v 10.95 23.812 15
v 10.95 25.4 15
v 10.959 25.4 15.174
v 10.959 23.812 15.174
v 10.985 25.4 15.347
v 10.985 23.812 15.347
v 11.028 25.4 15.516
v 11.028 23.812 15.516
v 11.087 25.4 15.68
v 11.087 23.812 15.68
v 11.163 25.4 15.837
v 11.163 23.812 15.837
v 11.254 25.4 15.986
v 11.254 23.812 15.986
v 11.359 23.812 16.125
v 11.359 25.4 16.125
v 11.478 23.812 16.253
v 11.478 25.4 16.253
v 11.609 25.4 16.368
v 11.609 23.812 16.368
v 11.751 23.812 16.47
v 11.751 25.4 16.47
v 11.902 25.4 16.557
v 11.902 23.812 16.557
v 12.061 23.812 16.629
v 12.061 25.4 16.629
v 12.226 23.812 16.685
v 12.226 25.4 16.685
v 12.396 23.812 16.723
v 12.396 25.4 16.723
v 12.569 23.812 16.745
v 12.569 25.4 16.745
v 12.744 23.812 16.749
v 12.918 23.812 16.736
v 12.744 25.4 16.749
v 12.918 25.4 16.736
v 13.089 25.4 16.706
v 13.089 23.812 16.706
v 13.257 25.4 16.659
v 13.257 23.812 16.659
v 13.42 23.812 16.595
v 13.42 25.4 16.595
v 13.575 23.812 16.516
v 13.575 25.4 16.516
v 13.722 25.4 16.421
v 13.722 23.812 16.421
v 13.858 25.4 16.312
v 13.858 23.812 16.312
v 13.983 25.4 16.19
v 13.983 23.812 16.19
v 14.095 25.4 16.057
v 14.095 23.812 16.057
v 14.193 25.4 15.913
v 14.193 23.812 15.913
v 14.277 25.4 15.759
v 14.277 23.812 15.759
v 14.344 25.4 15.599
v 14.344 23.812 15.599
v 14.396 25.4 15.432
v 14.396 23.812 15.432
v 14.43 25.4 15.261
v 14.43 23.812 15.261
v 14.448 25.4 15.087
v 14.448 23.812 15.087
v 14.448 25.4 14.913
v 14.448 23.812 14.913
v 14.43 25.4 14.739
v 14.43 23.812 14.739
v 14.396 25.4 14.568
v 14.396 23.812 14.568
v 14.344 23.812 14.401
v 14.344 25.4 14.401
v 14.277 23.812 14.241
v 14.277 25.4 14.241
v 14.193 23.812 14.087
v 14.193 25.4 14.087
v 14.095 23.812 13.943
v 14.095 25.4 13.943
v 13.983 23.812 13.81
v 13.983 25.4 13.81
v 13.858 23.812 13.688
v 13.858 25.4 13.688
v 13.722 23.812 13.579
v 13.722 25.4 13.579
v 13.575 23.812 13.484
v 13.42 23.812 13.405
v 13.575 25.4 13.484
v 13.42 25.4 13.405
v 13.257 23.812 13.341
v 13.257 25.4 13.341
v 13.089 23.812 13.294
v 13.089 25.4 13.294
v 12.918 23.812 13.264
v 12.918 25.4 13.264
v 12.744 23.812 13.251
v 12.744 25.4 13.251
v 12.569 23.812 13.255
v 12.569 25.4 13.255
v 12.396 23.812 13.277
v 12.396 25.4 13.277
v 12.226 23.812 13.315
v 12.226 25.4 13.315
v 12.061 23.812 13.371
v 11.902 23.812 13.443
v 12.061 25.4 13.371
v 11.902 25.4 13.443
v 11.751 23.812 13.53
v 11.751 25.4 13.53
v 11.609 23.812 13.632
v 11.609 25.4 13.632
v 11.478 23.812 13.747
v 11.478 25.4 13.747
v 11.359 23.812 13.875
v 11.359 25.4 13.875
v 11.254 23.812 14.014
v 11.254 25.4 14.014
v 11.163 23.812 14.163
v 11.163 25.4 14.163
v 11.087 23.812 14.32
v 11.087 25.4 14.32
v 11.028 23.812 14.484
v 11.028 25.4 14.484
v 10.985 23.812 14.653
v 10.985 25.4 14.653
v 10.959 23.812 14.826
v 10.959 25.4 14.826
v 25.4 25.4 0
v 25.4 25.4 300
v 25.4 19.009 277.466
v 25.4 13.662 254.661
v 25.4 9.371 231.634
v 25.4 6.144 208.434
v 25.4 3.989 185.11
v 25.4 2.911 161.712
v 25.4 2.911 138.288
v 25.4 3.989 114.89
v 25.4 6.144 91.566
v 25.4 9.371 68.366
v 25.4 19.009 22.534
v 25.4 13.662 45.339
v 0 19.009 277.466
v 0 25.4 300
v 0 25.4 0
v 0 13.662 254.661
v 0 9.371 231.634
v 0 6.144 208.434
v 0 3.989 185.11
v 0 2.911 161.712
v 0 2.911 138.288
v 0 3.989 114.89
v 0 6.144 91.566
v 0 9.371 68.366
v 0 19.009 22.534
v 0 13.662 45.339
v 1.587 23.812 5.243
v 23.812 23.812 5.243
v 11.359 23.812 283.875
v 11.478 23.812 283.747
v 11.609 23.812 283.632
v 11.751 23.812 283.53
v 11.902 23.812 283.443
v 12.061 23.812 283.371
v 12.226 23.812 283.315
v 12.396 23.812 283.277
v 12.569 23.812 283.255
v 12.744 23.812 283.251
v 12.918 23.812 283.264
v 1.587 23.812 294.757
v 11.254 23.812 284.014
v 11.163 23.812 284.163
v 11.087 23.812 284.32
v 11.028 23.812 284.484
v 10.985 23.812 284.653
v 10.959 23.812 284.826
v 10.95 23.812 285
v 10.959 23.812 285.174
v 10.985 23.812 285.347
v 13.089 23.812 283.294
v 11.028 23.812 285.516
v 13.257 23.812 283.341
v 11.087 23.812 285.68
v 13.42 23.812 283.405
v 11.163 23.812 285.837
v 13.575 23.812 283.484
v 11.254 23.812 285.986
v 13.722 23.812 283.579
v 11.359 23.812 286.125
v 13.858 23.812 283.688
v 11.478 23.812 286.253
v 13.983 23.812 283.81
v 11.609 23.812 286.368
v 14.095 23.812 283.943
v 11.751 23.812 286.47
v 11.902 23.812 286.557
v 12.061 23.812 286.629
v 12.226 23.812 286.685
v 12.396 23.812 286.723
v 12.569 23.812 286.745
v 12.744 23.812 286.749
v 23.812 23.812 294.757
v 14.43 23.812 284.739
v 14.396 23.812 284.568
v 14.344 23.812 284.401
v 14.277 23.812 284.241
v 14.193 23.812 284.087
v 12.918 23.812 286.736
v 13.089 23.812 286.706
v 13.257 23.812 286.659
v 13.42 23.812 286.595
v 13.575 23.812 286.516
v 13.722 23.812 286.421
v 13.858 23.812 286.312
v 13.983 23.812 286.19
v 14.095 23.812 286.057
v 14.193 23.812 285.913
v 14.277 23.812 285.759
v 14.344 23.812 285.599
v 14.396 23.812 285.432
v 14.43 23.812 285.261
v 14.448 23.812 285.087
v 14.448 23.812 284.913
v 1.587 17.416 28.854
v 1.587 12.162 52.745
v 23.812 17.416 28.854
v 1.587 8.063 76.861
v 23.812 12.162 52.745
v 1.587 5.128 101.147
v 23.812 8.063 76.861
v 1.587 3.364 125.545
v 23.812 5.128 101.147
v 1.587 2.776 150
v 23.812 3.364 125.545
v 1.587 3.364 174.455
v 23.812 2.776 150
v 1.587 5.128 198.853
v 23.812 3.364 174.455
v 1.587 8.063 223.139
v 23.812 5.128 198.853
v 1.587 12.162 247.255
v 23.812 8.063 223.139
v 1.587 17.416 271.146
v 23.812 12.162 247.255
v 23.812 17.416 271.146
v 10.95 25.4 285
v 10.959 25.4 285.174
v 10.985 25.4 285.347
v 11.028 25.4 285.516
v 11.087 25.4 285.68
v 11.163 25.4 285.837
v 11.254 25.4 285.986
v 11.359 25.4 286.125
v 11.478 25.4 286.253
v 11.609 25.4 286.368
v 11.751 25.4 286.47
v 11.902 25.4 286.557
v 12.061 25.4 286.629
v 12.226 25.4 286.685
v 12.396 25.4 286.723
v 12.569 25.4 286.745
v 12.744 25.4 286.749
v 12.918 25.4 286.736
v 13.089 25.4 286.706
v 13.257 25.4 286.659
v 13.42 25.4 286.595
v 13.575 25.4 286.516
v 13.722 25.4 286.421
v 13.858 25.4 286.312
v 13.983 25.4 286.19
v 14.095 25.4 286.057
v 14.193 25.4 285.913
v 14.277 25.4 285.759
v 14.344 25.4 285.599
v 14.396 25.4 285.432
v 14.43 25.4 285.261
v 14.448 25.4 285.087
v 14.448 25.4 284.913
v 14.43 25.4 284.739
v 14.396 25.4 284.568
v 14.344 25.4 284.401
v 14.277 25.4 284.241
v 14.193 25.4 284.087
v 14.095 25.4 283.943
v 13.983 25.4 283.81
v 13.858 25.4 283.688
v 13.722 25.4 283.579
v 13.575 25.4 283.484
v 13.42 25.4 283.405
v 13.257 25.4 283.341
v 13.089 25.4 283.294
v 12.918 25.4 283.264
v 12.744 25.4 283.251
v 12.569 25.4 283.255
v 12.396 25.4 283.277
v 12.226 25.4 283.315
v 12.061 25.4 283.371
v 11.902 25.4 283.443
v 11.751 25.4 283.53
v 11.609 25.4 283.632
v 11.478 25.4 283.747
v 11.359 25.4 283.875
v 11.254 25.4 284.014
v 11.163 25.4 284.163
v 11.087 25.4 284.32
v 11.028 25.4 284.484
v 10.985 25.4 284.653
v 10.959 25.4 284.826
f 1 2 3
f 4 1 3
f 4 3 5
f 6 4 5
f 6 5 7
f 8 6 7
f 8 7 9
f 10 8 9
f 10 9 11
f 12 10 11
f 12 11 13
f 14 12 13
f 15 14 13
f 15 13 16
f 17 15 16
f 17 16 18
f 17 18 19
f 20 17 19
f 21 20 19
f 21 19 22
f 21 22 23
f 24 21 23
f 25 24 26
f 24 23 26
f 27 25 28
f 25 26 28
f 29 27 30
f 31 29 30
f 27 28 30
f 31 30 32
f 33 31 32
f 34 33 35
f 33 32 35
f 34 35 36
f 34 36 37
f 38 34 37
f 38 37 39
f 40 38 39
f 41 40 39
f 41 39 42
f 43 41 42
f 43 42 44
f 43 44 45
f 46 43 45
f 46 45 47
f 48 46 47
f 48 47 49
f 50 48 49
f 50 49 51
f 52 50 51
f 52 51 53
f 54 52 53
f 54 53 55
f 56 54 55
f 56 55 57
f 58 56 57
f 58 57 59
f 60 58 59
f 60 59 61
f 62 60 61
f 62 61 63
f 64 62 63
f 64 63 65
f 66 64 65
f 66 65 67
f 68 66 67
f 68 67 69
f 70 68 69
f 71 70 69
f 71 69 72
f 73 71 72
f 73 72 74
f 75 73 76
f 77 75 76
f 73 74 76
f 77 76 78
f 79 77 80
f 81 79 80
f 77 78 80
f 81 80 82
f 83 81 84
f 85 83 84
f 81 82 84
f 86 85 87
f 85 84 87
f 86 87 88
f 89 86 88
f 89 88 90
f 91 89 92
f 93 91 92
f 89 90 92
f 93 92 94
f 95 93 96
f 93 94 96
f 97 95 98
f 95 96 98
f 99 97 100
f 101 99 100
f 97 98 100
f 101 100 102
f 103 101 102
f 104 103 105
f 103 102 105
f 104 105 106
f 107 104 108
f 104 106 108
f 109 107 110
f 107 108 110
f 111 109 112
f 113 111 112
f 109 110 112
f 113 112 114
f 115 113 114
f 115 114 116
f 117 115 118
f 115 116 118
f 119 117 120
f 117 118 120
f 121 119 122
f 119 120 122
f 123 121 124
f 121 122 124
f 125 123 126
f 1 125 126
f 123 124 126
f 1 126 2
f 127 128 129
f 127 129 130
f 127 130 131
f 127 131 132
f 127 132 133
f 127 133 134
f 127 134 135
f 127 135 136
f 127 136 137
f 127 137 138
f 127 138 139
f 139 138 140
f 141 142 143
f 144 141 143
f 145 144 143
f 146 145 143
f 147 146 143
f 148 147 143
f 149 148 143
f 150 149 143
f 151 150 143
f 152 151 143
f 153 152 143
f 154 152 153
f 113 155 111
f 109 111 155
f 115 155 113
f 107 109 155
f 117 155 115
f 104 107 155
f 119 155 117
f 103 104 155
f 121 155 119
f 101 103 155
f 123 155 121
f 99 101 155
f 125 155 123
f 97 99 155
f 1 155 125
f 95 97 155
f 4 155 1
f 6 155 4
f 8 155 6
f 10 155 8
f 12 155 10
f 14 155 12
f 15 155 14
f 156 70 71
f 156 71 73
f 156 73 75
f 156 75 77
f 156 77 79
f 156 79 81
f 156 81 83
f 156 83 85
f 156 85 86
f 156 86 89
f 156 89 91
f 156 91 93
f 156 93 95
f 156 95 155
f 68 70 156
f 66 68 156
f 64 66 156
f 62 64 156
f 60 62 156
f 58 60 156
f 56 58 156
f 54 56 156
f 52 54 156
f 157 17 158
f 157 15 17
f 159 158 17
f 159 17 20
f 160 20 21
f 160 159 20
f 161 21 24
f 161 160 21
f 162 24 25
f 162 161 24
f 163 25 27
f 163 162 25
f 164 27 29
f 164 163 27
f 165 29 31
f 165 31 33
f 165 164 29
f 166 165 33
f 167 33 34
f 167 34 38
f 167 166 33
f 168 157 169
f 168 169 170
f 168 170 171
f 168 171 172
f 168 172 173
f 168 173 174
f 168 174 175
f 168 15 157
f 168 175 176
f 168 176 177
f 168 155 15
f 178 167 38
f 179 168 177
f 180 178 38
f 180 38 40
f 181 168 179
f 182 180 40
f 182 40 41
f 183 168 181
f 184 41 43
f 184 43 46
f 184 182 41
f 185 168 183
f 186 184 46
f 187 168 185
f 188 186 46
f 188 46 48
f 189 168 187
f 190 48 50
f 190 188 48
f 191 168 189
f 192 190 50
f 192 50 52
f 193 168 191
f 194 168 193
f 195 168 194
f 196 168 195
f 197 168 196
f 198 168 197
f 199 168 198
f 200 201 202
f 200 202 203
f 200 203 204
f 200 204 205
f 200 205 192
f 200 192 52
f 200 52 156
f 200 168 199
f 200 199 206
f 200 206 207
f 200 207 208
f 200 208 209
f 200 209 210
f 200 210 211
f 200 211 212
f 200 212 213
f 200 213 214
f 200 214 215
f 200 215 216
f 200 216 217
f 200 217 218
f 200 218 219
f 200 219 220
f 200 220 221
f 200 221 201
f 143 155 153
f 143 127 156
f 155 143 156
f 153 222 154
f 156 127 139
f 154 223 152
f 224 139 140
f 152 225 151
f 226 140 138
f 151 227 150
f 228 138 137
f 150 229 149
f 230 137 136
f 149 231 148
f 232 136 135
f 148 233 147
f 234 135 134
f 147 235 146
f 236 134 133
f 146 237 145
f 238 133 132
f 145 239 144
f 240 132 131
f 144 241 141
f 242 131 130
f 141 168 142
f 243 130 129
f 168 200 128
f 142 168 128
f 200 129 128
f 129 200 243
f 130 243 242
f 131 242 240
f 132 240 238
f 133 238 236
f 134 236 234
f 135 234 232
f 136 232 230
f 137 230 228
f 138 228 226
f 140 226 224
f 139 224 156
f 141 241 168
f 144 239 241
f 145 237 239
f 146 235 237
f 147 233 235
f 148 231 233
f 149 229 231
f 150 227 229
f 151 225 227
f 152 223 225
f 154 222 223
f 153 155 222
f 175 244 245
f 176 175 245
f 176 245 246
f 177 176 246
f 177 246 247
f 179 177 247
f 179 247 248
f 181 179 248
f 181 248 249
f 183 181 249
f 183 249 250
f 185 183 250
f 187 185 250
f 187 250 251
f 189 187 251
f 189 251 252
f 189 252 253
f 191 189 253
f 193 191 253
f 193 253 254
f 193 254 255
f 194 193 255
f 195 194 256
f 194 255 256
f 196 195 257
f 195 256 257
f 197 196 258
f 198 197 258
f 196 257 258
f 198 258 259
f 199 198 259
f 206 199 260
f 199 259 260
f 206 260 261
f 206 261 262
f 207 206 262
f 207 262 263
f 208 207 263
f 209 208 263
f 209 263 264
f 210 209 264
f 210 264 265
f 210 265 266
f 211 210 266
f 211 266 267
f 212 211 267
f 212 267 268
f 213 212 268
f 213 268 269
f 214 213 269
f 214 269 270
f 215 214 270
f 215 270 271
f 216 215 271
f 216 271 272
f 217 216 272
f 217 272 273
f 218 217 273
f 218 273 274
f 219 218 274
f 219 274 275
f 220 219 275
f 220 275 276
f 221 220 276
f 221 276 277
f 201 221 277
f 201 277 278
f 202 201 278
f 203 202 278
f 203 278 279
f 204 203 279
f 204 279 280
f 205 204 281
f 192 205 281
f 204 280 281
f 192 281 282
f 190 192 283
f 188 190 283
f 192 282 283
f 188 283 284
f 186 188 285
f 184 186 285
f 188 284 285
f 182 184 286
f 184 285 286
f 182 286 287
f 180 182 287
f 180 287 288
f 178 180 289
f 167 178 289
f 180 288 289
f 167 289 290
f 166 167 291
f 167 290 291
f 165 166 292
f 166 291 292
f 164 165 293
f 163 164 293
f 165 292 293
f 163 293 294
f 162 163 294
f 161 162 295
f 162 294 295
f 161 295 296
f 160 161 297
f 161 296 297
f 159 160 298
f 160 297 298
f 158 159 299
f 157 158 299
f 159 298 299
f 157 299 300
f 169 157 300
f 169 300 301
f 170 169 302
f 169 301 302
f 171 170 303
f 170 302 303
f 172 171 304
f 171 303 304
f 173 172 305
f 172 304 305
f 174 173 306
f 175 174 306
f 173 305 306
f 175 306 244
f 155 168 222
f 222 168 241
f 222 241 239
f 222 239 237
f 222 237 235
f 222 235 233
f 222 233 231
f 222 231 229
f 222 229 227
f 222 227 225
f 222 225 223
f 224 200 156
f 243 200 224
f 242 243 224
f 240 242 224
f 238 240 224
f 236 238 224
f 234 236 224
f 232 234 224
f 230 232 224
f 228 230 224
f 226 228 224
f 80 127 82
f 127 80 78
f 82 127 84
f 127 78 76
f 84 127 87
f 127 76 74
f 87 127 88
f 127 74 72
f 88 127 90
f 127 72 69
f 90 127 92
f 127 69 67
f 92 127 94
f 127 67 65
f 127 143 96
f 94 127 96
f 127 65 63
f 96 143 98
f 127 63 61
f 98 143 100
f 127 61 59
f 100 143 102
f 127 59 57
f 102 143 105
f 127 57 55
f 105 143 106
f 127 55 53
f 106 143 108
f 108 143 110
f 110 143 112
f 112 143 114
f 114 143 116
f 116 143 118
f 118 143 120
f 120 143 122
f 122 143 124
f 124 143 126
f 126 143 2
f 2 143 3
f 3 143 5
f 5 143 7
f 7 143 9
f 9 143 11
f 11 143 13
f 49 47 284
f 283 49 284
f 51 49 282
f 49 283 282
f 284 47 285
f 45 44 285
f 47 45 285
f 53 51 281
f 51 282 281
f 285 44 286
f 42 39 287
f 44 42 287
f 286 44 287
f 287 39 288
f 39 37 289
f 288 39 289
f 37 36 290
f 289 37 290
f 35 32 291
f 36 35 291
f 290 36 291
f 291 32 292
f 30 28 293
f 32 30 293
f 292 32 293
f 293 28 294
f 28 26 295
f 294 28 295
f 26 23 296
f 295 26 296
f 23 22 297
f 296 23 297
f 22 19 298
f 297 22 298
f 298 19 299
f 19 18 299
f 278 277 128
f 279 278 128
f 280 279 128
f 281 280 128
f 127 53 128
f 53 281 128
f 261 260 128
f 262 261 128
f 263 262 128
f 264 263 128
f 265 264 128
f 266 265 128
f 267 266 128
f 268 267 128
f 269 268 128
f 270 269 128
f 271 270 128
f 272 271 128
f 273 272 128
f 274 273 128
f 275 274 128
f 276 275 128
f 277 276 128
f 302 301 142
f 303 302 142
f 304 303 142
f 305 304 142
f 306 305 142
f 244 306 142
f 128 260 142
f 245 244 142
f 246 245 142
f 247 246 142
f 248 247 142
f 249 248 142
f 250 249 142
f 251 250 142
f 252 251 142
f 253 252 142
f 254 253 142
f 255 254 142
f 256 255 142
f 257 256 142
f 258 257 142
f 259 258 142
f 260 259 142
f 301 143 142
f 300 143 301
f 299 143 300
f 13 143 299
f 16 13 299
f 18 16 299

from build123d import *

# Parameters (mm, degrees)
F0_W     = 25.4
F0_H     = 300
F1_DEPTH = 25.4
F2_W     = 22.225
F2_H     = 22.225
F3_DEPTH = 300
F5_DEPTH = 25.4
F6_R     = 1.75
F7_DEPTH = 25


with BuildPart() as f1:
    # F0 (on Right) → F1 (new body)
    with BuildSketch(Plane.YZ):
        with Locations((12.7, 150)):
            Rectangle(F0_W, F0_H)
    extrude(amount=F1_DEPTH)

    # F2 (on face) → F3 (cut)
    with BuildSketch(Plane.XY.offset(300)):
        with Locations((12.7, 12.7)):
            Rectangle(F2_W, F2_H)
    extrude(amount=-F3_DEPTH, mode=Mode.SUBTRACT)

    # F4 (on face) → F5 (cut)
    with BuildSketch(Plane.YZ.offset(25.4)):
        with BuildLine():
            ThreePointArc((25.4, 0), (2.775952, 150), (25.4, 300))
            Line((25.4, 300), (0, 300))
            Line((0, 300), (0, 0))
            Line((0, 0), (25.4, 0))
        make_face()
    extrude(amount=-F5_DEPTH, mode=Mode.SUBTRACT)

    # F6 (on face) → F7 (cut)
    with BuildSketch(Plane(origin=(0, 25.4, 0), x_dir=(-1, 0, 0), z_dir=(0, 1, 0))):
        with Locations((-12.7, 285)):
            Circle(F6_R)
        with Locations((-12.7, 15)):
            Circle(F6_R)
    extrude(amount=-F7_DEPTH, mode=Mode.SUBTRACT)


solid = f1.part
